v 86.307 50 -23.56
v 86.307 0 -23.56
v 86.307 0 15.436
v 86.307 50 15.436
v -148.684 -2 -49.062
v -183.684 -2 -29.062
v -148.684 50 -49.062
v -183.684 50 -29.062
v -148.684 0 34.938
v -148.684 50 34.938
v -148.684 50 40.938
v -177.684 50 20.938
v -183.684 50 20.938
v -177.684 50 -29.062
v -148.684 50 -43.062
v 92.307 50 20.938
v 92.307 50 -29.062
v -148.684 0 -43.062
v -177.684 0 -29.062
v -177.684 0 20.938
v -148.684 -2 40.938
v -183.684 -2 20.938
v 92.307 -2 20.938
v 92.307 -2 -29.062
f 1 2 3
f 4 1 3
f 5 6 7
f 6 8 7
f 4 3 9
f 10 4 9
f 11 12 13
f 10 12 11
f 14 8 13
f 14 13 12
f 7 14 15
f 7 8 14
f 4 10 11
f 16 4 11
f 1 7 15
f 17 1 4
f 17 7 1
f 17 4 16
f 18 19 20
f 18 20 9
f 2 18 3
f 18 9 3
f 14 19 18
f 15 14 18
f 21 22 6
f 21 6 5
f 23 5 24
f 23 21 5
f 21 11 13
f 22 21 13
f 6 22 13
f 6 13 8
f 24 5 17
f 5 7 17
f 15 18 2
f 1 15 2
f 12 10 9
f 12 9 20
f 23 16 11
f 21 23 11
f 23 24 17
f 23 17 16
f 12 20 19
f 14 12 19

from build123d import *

# Parameters (mm, degrees)
BOSS_EXTRUDE5_DEPTH = 50
BOSS_EXTRUDE6_DEPTH = 2


with BuildPart() as part:
    # Sketch1 → Boss-Extrude5 (new body)
    with BuildSketch(Plane(origin=(0, 0, 0), x_dir=(1, 0, 0), z_dir=(0, 1, 0))):
        Polygon((-148.684110885, 49.061860601), (-183.684110885, 29.061860601), (-183.684110885, -20.938139399), (-148.684110885, -40.938139399), (92.307295507, -20.938139399), (92.307295507, -14.938139399), (92.307295507, 23.061860601), (92.307295507, 29.061860601), align=None)
        Polygon((-177.684110885, -20.938139399), (-177.684110885, 29.061860601), (-148.684110885, 43.061860601), (86.307295507, 23.559803668), (86.307295507, 23.061860601), (86.307295507, -14.938139399), (86.307295507, -15.436082465), (-148.684110885, -34.938139399), align=None, mode=Mode.SUBTRACT)
    extrude(amount=BOSS_EXTRUDE5_DEPTH)

    # Sketch3 → Boss-Extrude6 (add)
    with BuildSketch(Plane.XZ):
        Polygon((-183.684110885, 20.938139399), (-183.684110885, -29.061860601), (-148.684110885, -49.061860601), (92.307295507, -29.061860601), (92.307295507, 20.938139399), (-148.684110885, 40.938139399), align=None)
    extrude(amount=BOSS_EXTRUDE6_DEPTH)


solid = part.part
